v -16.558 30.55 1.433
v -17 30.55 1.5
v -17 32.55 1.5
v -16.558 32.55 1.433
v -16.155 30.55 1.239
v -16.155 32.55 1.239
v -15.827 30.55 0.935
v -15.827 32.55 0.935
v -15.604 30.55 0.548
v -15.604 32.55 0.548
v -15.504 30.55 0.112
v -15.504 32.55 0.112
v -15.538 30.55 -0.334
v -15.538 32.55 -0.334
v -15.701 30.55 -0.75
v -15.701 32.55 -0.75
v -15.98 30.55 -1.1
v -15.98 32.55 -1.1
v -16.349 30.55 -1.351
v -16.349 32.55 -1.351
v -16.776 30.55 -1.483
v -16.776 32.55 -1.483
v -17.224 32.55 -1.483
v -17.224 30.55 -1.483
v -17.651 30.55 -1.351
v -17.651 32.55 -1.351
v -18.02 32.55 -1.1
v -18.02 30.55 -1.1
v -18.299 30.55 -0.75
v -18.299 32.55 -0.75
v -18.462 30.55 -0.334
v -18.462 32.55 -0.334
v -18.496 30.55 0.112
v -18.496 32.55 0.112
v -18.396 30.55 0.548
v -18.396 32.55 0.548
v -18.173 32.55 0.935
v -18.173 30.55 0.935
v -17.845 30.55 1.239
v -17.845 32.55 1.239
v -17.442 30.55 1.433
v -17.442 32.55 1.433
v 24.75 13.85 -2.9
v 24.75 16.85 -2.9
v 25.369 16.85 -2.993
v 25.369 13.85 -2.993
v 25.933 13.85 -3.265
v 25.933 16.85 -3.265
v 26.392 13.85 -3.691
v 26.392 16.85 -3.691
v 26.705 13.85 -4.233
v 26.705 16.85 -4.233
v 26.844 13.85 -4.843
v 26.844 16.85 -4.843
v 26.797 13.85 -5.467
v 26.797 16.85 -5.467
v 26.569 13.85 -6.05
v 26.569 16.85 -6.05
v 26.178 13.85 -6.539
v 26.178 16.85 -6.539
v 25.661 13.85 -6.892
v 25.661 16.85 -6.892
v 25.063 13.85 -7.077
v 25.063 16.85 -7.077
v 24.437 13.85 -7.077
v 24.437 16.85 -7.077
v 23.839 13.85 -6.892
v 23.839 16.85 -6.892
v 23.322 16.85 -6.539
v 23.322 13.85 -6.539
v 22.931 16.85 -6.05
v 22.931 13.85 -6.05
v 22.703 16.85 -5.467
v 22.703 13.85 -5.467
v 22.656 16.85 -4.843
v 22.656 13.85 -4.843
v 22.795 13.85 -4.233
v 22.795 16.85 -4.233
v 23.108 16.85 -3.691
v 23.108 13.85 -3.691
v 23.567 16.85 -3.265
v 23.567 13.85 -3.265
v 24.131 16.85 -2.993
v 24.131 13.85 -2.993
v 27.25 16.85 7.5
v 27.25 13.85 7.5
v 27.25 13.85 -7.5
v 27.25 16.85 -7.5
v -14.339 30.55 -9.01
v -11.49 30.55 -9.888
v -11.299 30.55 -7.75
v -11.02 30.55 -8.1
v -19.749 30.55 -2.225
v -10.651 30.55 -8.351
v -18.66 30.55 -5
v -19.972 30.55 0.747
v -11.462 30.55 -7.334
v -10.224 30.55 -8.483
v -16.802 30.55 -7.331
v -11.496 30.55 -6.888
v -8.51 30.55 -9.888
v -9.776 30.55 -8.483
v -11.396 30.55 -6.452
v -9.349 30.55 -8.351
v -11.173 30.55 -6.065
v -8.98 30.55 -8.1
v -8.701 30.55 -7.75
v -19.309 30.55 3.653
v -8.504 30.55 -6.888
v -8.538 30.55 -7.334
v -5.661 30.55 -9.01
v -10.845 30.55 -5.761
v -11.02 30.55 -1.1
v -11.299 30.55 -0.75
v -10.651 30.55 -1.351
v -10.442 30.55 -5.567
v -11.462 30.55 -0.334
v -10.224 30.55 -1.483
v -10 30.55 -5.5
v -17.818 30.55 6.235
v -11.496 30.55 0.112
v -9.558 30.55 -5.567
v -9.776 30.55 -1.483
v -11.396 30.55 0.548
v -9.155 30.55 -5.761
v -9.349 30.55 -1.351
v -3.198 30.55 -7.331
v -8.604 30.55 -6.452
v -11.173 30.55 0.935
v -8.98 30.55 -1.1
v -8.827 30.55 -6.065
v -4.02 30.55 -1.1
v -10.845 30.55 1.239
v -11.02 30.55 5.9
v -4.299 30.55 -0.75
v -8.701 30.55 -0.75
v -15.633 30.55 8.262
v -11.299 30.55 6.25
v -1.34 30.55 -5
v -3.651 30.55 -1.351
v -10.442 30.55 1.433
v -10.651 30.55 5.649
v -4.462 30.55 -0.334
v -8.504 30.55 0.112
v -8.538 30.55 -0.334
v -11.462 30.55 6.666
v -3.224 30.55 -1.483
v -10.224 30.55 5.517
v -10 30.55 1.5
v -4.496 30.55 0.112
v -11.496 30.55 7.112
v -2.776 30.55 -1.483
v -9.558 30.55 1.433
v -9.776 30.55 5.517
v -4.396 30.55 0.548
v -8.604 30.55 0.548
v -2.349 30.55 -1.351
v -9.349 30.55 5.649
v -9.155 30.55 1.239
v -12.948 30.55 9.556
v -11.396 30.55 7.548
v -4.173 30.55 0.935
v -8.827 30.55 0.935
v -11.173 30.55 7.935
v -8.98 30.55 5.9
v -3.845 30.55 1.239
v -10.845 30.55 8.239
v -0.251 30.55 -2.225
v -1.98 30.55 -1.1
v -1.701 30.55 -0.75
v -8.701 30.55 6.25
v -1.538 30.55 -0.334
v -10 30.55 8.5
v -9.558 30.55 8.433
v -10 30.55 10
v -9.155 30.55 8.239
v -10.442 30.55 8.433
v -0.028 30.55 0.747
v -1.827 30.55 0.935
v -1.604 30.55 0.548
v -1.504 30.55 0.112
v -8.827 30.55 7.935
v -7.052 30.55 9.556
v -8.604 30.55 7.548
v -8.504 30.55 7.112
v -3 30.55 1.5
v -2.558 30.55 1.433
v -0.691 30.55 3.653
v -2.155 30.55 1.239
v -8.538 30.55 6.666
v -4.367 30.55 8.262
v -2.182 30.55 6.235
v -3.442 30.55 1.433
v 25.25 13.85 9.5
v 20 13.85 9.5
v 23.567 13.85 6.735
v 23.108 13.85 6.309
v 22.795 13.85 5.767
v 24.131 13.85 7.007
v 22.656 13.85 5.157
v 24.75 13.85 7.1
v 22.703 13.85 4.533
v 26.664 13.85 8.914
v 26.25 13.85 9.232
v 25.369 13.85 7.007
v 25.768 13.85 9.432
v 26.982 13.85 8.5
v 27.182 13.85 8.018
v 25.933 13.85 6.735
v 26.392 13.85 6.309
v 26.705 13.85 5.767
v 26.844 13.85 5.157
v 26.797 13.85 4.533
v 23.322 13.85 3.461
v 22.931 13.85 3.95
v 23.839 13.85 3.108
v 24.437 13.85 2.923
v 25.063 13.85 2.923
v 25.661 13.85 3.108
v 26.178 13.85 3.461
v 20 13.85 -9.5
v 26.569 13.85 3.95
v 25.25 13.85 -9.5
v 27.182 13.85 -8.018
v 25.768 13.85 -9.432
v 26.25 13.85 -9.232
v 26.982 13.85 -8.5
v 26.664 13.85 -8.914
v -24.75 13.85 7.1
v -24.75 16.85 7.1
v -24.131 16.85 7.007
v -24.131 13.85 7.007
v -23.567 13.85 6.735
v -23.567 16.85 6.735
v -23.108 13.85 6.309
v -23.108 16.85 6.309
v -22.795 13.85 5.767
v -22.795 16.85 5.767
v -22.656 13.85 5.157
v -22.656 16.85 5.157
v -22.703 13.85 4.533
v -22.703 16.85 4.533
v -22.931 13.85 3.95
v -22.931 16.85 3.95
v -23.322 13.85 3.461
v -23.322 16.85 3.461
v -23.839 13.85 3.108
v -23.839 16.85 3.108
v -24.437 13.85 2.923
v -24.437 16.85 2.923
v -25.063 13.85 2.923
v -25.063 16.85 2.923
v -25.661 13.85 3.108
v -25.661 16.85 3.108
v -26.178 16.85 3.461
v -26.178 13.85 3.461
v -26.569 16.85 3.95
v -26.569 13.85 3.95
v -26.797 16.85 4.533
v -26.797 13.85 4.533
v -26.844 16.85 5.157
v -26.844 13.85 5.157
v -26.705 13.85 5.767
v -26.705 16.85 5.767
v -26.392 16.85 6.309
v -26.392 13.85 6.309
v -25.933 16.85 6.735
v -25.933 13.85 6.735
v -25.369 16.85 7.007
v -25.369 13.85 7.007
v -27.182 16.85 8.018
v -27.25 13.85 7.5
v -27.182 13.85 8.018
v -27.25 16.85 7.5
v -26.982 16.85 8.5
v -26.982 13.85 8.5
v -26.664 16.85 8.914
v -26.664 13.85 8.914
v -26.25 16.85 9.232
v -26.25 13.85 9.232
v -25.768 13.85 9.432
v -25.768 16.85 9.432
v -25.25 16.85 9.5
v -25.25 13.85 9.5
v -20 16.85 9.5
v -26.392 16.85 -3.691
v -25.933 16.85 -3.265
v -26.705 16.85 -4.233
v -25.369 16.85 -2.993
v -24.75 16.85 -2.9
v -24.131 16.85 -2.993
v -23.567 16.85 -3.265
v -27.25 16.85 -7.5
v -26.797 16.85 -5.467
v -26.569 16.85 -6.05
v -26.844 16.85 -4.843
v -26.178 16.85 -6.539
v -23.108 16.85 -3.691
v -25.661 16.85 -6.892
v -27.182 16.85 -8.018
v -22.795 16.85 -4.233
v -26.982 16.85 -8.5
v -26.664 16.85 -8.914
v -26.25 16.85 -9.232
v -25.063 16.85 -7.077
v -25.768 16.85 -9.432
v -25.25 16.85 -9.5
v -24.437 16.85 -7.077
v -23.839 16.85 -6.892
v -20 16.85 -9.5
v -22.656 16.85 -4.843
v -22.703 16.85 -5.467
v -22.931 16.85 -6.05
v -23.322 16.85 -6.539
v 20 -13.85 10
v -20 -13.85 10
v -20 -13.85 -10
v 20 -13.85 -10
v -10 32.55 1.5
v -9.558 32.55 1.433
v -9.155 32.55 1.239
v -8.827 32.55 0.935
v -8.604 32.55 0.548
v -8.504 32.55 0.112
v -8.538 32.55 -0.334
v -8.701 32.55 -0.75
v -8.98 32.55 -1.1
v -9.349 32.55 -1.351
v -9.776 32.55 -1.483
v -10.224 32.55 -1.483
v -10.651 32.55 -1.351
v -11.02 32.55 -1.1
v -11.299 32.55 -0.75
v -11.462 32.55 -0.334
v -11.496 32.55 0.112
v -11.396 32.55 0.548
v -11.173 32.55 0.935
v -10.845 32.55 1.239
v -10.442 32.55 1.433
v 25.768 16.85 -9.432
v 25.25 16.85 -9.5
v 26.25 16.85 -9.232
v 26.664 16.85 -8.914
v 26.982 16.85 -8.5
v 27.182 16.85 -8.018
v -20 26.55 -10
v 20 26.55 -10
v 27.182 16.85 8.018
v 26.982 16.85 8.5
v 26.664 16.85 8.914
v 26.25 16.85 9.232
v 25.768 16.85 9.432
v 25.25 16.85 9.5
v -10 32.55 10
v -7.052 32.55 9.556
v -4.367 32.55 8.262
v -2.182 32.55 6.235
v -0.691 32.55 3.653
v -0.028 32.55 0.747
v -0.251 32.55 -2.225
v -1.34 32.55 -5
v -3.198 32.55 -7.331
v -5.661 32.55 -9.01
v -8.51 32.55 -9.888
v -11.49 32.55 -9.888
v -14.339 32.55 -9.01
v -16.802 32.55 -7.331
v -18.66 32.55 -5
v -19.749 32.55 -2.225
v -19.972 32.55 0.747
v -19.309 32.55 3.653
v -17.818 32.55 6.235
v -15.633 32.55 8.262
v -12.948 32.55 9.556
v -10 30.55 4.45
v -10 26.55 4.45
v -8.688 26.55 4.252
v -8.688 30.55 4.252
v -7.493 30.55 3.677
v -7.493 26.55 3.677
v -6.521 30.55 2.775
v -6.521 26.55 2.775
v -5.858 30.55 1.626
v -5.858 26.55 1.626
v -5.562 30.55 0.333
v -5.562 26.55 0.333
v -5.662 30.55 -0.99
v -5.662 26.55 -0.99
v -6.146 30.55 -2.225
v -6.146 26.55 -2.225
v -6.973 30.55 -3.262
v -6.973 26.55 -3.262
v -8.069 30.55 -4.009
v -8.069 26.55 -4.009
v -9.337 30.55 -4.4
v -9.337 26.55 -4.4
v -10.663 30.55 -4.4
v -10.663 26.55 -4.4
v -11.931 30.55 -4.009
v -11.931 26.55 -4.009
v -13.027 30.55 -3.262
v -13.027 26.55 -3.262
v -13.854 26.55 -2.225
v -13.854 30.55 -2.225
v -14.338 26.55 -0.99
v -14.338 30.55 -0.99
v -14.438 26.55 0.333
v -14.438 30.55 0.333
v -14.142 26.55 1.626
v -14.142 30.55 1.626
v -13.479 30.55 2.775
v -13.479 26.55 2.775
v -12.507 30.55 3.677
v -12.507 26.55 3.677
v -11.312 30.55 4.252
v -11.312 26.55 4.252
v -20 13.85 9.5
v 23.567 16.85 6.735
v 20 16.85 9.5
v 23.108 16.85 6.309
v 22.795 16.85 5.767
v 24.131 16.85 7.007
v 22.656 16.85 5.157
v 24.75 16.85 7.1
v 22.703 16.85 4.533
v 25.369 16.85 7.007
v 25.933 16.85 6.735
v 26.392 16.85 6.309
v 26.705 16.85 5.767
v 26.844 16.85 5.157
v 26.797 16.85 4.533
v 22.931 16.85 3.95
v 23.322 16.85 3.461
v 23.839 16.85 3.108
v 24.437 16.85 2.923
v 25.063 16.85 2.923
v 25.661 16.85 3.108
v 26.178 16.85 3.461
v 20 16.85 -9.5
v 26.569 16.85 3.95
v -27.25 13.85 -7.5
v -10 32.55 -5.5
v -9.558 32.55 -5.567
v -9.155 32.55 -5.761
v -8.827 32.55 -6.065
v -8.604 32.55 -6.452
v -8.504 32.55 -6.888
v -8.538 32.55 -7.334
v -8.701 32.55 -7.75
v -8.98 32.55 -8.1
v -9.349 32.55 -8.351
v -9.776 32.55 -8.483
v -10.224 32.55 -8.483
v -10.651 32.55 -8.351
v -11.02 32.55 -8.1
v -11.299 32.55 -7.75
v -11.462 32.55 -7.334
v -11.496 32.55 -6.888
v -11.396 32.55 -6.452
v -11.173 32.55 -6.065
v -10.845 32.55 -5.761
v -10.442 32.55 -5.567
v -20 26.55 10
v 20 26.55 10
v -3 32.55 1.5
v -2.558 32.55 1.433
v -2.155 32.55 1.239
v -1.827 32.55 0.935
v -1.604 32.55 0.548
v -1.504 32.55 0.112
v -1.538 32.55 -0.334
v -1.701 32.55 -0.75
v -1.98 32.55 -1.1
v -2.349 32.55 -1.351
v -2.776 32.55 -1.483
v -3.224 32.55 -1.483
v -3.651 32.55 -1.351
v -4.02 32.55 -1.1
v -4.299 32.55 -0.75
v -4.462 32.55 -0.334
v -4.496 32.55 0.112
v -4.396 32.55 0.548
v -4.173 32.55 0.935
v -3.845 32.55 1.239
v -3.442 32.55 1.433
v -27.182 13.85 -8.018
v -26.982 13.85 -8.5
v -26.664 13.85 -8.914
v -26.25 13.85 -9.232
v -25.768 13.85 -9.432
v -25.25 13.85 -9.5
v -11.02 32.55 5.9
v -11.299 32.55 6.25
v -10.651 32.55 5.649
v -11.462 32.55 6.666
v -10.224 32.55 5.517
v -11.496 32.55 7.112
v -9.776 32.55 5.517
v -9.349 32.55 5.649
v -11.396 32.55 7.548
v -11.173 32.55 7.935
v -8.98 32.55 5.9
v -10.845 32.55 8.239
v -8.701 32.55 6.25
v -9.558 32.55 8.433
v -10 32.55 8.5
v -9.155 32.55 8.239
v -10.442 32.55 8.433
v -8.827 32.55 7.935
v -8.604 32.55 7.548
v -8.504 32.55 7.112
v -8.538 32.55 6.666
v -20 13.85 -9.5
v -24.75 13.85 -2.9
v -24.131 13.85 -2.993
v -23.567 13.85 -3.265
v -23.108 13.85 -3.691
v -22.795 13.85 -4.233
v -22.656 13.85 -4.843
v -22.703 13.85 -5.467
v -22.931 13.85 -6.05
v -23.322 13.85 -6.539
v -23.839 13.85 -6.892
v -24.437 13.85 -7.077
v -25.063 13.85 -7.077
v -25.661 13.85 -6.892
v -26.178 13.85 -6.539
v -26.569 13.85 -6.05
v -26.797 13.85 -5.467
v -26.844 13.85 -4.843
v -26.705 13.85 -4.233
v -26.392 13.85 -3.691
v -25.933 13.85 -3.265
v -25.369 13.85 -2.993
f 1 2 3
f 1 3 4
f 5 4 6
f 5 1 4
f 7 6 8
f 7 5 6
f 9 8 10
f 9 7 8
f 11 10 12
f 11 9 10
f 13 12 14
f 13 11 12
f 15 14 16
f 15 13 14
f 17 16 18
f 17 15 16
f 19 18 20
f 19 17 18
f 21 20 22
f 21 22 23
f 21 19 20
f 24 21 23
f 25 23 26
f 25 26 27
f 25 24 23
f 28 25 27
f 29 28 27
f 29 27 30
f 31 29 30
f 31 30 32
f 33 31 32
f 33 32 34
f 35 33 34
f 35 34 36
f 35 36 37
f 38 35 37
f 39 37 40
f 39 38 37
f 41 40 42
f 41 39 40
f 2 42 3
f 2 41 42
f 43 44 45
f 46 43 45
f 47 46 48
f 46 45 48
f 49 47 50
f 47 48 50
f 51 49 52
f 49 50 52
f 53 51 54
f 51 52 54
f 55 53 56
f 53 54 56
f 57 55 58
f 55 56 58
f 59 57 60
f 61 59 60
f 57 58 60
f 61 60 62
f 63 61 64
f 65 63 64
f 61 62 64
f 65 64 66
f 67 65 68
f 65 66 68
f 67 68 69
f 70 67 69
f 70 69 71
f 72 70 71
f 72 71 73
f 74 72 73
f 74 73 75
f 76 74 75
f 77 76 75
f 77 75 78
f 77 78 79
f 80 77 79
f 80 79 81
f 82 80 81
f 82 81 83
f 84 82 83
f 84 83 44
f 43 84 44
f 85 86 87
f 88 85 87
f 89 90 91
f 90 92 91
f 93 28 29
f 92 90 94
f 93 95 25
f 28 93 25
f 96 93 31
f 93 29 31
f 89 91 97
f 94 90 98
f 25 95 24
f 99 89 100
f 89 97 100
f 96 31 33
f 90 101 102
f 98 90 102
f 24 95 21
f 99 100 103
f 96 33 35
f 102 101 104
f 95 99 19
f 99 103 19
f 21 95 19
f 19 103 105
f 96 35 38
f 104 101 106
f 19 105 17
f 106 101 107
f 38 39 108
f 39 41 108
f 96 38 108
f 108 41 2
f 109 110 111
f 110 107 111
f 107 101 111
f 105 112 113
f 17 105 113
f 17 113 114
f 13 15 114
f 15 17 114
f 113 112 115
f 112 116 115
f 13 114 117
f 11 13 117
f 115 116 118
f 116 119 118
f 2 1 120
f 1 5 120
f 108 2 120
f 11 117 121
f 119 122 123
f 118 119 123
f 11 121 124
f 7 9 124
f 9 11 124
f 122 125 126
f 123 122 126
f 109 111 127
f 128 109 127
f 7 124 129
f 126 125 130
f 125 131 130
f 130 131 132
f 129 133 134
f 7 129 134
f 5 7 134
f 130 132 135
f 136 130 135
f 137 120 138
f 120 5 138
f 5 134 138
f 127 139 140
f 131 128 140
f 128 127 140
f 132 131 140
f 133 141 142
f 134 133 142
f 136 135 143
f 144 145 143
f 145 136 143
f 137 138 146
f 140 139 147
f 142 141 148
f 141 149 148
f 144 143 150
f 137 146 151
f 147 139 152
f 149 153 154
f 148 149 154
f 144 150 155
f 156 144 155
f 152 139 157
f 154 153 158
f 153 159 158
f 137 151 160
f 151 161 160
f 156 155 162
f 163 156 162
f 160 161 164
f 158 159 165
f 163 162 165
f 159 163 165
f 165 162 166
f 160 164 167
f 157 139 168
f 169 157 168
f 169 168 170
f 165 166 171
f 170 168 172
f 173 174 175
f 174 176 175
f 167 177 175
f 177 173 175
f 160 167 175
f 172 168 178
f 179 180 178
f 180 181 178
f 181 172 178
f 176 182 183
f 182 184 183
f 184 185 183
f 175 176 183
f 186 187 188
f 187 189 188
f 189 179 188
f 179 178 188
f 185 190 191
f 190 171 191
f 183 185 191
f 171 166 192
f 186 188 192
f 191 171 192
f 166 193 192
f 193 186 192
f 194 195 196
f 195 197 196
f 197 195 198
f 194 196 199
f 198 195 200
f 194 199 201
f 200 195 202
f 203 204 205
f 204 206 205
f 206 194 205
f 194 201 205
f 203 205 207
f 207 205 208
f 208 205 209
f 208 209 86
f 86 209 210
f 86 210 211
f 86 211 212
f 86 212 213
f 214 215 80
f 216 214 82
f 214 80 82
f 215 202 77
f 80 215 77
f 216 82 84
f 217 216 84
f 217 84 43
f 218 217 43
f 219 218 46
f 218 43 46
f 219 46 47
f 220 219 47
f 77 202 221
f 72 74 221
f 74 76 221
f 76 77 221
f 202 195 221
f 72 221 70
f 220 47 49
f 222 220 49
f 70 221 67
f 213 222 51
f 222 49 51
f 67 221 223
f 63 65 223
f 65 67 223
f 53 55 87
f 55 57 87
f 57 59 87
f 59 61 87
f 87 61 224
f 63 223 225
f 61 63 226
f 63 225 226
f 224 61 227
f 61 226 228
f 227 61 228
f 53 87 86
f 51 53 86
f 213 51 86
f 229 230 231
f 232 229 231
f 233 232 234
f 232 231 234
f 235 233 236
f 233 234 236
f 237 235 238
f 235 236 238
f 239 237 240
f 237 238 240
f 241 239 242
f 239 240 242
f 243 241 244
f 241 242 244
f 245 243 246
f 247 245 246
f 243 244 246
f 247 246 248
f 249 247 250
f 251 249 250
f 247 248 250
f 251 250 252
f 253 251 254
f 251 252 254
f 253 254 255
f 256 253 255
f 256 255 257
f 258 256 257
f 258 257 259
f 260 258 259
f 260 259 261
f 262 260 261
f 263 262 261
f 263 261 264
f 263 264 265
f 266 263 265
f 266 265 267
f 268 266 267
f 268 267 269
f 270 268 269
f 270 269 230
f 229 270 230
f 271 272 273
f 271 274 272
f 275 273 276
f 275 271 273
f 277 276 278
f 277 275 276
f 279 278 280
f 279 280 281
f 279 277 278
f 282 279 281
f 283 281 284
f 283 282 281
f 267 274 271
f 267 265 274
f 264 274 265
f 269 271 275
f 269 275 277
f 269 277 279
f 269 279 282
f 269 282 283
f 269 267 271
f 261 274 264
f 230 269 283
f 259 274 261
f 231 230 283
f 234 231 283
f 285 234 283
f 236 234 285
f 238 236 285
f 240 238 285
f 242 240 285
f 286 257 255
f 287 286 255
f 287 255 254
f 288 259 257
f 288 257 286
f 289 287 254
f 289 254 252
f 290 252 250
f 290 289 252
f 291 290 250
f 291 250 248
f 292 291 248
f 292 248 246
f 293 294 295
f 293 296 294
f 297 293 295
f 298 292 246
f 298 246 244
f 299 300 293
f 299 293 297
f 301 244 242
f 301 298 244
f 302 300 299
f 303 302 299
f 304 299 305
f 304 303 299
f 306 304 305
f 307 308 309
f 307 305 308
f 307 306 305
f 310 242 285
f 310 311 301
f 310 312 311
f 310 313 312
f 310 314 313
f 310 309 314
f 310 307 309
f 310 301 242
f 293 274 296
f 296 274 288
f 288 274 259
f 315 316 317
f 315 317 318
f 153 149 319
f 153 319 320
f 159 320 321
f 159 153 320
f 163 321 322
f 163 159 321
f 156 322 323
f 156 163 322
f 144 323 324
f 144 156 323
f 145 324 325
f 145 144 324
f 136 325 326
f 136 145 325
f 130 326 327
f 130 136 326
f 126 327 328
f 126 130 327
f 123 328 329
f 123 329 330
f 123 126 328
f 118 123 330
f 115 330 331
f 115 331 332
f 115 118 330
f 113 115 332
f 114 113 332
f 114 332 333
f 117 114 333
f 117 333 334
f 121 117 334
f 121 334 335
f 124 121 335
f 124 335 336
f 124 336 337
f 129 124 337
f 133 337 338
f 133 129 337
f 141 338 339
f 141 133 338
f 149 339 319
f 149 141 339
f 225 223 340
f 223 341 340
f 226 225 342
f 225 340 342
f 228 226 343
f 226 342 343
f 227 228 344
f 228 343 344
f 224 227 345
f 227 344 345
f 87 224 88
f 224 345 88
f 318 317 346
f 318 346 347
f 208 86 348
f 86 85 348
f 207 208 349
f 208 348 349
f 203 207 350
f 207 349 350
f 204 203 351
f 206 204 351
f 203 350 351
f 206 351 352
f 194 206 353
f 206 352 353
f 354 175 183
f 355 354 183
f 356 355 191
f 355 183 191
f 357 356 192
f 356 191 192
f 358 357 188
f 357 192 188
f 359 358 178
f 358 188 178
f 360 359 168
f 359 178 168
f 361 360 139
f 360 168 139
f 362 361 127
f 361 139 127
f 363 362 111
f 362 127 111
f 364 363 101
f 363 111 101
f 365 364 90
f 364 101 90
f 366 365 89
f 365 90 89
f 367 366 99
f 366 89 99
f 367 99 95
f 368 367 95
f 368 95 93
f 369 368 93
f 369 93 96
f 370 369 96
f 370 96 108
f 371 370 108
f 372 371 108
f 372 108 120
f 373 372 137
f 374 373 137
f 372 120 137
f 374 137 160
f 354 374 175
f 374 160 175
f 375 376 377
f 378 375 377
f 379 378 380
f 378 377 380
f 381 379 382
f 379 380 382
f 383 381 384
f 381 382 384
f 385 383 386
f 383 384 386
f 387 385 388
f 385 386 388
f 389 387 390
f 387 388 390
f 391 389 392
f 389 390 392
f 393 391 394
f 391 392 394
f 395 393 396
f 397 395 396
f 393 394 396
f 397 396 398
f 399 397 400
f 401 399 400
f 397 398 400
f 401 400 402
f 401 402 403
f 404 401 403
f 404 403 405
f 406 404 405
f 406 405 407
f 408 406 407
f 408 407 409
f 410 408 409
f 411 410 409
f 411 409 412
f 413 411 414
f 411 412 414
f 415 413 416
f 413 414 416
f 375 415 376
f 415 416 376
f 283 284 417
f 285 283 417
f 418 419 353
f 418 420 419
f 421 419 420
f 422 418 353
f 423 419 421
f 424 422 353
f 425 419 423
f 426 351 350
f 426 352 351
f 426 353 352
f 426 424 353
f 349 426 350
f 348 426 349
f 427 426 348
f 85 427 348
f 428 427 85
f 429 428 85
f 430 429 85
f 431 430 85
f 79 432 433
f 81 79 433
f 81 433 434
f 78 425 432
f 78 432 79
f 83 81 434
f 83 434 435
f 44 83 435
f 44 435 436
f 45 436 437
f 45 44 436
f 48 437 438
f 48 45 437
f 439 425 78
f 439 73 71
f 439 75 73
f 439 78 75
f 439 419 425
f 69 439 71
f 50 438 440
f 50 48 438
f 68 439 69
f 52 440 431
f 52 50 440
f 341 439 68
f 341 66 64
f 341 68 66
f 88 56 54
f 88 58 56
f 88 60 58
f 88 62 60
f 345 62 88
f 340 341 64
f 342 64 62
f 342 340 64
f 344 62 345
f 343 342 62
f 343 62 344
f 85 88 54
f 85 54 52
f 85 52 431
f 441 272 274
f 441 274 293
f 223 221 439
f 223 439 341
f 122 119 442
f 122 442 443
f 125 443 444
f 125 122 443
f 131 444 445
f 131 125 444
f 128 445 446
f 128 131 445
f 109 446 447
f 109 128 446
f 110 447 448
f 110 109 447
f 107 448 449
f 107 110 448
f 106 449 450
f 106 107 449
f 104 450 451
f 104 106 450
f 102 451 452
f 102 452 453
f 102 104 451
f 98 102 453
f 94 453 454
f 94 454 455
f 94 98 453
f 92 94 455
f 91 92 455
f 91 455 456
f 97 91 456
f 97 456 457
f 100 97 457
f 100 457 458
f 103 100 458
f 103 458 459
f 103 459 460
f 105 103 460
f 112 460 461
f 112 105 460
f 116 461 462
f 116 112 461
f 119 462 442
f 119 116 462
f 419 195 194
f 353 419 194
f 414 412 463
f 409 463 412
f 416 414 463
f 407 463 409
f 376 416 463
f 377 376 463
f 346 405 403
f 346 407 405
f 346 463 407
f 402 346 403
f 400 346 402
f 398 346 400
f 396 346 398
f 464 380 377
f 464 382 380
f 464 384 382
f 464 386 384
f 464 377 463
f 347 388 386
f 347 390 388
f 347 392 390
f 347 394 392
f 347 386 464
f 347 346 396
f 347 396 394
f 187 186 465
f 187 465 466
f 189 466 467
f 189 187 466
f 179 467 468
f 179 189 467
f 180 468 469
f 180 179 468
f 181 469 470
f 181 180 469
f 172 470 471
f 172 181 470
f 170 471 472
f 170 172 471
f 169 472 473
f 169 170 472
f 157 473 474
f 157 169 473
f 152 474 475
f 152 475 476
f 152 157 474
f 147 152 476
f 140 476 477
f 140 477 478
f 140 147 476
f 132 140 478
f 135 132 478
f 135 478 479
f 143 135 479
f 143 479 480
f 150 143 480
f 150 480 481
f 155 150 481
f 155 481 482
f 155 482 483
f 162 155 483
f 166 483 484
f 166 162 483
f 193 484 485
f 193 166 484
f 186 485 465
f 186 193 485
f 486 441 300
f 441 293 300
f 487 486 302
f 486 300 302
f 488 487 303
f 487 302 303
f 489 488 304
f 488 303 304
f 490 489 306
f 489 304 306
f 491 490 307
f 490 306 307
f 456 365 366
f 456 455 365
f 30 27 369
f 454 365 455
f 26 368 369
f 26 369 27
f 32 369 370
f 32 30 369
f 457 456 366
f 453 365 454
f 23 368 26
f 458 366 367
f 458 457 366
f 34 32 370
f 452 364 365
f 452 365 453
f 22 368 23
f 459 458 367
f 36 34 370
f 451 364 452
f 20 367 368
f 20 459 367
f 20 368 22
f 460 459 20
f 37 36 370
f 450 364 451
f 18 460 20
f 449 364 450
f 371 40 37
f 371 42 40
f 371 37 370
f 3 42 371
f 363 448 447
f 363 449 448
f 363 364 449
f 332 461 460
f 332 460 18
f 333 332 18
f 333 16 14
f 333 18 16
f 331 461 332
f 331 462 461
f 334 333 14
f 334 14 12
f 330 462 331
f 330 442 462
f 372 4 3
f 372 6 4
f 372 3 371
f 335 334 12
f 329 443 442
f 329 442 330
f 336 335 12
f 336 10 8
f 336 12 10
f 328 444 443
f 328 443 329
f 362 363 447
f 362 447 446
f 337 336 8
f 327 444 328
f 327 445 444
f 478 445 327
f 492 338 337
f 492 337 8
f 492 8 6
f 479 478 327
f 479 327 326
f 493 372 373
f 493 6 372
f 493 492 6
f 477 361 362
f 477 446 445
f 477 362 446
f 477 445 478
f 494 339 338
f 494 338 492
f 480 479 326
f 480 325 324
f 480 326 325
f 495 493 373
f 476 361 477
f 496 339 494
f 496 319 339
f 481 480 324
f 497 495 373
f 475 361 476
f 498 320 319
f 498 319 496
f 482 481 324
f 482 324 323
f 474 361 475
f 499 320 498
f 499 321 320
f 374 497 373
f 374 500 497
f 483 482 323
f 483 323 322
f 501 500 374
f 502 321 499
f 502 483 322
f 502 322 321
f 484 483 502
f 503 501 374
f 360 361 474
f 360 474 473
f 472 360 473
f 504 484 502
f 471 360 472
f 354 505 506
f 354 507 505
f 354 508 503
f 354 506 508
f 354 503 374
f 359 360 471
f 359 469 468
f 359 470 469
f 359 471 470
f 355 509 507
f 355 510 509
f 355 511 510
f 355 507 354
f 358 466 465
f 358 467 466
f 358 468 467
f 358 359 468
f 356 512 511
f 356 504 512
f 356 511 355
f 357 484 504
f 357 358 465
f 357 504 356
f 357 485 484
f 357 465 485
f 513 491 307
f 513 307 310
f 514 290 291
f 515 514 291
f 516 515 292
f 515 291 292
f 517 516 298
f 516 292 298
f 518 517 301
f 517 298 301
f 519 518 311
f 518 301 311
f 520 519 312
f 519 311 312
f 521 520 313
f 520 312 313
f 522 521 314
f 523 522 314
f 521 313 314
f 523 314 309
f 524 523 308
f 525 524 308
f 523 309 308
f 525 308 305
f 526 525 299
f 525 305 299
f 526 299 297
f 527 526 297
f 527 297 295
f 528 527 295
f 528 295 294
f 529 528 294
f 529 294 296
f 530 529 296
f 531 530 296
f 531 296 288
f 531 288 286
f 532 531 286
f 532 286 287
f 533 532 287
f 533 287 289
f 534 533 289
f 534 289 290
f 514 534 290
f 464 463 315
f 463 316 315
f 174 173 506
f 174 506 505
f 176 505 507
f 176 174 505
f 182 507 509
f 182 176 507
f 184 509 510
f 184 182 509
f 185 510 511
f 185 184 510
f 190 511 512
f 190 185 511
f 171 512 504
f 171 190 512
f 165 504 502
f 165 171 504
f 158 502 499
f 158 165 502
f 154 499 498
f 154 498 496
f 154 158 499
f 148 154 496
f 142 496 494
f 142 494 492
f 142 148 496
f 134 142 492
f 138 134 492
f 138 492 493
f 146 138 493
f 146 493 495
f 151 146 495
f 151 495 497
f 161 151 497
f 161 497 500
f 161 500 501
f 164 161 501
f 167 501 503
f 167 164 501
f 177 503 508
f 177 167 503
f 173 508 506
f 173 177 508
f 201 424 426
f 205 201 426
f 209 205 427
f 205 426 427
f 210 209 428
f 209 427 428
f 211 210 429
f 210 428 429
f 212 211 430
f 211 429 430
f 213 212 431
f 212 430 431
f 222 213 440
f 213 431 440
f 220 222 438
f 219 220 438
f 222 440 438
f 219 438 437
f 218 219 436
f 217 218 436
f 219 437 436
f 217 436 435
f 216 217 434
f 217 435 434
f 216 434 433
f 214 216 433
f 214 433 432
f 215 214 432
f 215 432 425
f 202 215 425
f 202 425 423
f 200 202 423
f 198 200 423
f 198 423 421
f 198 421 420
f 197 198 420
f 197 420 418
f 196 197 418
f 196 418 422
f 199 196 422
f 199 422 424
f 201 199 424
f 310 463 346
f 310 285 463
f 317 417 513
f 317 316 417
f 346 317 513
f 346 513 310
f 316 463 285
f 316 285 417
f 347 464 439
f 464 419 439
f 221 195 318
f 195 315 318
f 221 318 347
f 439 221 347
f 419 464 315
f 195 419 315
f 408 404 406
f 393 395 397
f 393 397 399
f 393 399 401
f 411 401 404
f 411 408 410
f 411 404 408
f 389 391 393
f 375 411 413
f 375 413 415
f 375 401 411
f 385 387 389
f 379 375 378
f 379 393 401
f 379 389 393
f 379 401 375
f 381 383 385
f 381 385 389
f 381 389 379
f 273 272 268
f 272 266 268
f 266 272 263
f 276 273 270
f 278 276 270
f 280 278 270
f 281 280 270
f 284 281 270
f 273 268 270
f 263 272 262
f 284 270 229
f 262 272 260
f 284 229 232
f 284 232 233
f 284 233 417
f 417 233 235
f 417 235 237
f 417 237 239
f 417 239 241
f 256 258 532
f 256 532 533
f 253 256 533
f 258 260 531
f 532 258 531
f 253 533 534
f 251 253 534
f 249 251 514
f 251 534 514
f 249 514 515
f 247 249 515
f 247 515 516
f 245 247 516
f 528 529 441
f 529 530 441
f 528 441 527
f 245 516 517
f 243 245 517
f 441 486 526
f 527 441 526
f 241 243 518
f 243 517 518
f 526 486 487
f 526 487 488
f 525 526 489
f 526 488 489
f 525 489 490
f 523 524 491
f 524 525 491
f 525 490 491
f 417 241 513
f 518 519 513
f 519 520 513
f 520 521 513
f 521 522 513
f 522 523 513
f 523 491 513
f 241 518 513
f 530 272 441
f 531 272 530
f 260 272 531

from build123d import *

# Parameters (mm, degrees)
SKETCH_1_W          = 40
SKETCH_1_H          = 27.7
EXTRUDE_1_DEPTH     = 10
SKETCH_3_W          = 54.5
SKETCH_3_H          = 19
SKETCH_3_W_2        = 40
SKETCH_3_H_2        = 20
EXTRUDE_2_DEPTH     = 3
FILLET_1_R          = 2
SKETCH_4_W          = 40
SKETCH_4_H          = 20
EXTRUDE_3_DEPTH     = 9.7
SKETCH_5_R          = 2.1
CUT_EXTRUDE_1_DEPTH = 43.249881657
SKETCH_6_R          = 4.45
EXTRUDE_4_DEPTH     = 4
SKETCH_8_R          = 10
SKETCH_8_R_2        = 1.5
EXTRUDE_5_DEPTH     = 2


with BuildPart() as part:
    # 草图1 → 凸台-拉伸1 (new, symmetric)
    with BuildSketch(Plane.XY):
        Rectangle(SKETCH_1_W, SKETCH_1_H)
    extrude(amount=EXTRUDE_1_DEPTH, both=True)

    # 草图3 → 凸台-拉伸2 (add)
    with BuildSketch(Plane(origin=(0, 13.85, 0), x_dir=(1, 0, 0), z_dir=(0, 1, 0))):
        Rectangle(SKETCH_3_W, SKETCH_3_H)
        Rectangle(SKETCH_3_W_2, SKETCH_3_H_2)
    extrude(amount=EXTRUDE_2_DEPTH)

    # 圆角1
    fillet_1_edges = [part.edges().sort_by_distance(p)[0] for p in [
        (27.25, 15.35, 9.5),
        (27.25, 15.35, -9.5),
        (-27.25, 15.35, -9.5),
        (-27.25, 15.35, 9.5),
    ]]
    fillet(fillet_1_edges, radius=FILLET_1_R)

    # 草图4 → 凸台-拉伸3 (add)
    with BuildSketch(Plane(origin=(0, 16.85, 0), x_dir=(1, 0, 0), z_dir=(0, 1, 0))):
        Rectangle(SKETCH_4_W, SKETCH_4_H)
    extrude(amount=EXTRUDE_3_DEPTH)

    # 草图5 → 切除-拉伸1 (cut, through all)
    with BuildSketch(Plane(origin=(0, 16.85, 0), x_dir=(1, 0, 0), z_dir=(0, 1, 0))):
        with Locations(Location((-24.75, 5, 0), (0, 0, 270))):
            Circle(SKETCH_5_R)
        with Locations(Location((-24.75, -5, 0), (0, 0, 270))):
            Circle(SKETCH_5_R)
        with Locations(Location((24.75, -5, 0), (0, 0, 270))):
            Circle(SKETCH_5_R)
        with Locations(Location((24.75, 5, 0), (0, 0, 270))):
            Circle(SKETCH_5_R)
    extrude(amount=-CUT_EXTRUDE_1_DEPTH, mode=Mode.SUBTRACT)

    # 草图6 → 凸台-拉伸4 (add)
    with BuildSketch(Plane(origin=(0, 26.55, 0), x_dir=(1, 0, 0), z_dir=(0, 1, 0))):
        with Locations(Location((-10, 0, 0), (0, 0, 270))):
            Circle(SKETCH_6_R)
    extrude(amount=EXTRUDE_4_DEPTH)


with BuildPart() as body_2:
    # 草图8 → 凸台-拉伸5 (new body)
    with BuildSketch(Plane(origin=(0, 30.55, 0), x_dir=(1, 0, 0), z_dir=(0, 1, 0))):
        with Locations(Location((-10, 0, 0), (0, 0, 270))):
            Circle(SKETCH_8_R)
        with Locations(Location((-10, 7, 0), (0, 0, 270))):
            Circle(SKETCH_8_R_2, mode=Mode.SUBTRACT)
        with Locations(Location((-3, 0, 0), (0, 0, 270))):
            Circle(SKETCH_8_R_2, mode=Mode.SUBTRACT)
        with Locations(Location((-10, -7, 0), (0, 0, 270))):
            Circle(SKETCH_8_R_2, mode=Mode.SUBTRACT)
        with Locations(Location((-17, 0, 0), (0, 0, 270))):
            Circle(SKETCH_8_R_2, mode=Mode.SUBTRACT)
        with Locations(Location((-10, 0, 0), (0, 0, 270))):
            Circle(SKETCH_8_R_2, mode=Mode.SUBTRACT)
    extrude(amount=EXTRUDE_5_DEPTH)


solid = Compound([part.part, body_2.part])
